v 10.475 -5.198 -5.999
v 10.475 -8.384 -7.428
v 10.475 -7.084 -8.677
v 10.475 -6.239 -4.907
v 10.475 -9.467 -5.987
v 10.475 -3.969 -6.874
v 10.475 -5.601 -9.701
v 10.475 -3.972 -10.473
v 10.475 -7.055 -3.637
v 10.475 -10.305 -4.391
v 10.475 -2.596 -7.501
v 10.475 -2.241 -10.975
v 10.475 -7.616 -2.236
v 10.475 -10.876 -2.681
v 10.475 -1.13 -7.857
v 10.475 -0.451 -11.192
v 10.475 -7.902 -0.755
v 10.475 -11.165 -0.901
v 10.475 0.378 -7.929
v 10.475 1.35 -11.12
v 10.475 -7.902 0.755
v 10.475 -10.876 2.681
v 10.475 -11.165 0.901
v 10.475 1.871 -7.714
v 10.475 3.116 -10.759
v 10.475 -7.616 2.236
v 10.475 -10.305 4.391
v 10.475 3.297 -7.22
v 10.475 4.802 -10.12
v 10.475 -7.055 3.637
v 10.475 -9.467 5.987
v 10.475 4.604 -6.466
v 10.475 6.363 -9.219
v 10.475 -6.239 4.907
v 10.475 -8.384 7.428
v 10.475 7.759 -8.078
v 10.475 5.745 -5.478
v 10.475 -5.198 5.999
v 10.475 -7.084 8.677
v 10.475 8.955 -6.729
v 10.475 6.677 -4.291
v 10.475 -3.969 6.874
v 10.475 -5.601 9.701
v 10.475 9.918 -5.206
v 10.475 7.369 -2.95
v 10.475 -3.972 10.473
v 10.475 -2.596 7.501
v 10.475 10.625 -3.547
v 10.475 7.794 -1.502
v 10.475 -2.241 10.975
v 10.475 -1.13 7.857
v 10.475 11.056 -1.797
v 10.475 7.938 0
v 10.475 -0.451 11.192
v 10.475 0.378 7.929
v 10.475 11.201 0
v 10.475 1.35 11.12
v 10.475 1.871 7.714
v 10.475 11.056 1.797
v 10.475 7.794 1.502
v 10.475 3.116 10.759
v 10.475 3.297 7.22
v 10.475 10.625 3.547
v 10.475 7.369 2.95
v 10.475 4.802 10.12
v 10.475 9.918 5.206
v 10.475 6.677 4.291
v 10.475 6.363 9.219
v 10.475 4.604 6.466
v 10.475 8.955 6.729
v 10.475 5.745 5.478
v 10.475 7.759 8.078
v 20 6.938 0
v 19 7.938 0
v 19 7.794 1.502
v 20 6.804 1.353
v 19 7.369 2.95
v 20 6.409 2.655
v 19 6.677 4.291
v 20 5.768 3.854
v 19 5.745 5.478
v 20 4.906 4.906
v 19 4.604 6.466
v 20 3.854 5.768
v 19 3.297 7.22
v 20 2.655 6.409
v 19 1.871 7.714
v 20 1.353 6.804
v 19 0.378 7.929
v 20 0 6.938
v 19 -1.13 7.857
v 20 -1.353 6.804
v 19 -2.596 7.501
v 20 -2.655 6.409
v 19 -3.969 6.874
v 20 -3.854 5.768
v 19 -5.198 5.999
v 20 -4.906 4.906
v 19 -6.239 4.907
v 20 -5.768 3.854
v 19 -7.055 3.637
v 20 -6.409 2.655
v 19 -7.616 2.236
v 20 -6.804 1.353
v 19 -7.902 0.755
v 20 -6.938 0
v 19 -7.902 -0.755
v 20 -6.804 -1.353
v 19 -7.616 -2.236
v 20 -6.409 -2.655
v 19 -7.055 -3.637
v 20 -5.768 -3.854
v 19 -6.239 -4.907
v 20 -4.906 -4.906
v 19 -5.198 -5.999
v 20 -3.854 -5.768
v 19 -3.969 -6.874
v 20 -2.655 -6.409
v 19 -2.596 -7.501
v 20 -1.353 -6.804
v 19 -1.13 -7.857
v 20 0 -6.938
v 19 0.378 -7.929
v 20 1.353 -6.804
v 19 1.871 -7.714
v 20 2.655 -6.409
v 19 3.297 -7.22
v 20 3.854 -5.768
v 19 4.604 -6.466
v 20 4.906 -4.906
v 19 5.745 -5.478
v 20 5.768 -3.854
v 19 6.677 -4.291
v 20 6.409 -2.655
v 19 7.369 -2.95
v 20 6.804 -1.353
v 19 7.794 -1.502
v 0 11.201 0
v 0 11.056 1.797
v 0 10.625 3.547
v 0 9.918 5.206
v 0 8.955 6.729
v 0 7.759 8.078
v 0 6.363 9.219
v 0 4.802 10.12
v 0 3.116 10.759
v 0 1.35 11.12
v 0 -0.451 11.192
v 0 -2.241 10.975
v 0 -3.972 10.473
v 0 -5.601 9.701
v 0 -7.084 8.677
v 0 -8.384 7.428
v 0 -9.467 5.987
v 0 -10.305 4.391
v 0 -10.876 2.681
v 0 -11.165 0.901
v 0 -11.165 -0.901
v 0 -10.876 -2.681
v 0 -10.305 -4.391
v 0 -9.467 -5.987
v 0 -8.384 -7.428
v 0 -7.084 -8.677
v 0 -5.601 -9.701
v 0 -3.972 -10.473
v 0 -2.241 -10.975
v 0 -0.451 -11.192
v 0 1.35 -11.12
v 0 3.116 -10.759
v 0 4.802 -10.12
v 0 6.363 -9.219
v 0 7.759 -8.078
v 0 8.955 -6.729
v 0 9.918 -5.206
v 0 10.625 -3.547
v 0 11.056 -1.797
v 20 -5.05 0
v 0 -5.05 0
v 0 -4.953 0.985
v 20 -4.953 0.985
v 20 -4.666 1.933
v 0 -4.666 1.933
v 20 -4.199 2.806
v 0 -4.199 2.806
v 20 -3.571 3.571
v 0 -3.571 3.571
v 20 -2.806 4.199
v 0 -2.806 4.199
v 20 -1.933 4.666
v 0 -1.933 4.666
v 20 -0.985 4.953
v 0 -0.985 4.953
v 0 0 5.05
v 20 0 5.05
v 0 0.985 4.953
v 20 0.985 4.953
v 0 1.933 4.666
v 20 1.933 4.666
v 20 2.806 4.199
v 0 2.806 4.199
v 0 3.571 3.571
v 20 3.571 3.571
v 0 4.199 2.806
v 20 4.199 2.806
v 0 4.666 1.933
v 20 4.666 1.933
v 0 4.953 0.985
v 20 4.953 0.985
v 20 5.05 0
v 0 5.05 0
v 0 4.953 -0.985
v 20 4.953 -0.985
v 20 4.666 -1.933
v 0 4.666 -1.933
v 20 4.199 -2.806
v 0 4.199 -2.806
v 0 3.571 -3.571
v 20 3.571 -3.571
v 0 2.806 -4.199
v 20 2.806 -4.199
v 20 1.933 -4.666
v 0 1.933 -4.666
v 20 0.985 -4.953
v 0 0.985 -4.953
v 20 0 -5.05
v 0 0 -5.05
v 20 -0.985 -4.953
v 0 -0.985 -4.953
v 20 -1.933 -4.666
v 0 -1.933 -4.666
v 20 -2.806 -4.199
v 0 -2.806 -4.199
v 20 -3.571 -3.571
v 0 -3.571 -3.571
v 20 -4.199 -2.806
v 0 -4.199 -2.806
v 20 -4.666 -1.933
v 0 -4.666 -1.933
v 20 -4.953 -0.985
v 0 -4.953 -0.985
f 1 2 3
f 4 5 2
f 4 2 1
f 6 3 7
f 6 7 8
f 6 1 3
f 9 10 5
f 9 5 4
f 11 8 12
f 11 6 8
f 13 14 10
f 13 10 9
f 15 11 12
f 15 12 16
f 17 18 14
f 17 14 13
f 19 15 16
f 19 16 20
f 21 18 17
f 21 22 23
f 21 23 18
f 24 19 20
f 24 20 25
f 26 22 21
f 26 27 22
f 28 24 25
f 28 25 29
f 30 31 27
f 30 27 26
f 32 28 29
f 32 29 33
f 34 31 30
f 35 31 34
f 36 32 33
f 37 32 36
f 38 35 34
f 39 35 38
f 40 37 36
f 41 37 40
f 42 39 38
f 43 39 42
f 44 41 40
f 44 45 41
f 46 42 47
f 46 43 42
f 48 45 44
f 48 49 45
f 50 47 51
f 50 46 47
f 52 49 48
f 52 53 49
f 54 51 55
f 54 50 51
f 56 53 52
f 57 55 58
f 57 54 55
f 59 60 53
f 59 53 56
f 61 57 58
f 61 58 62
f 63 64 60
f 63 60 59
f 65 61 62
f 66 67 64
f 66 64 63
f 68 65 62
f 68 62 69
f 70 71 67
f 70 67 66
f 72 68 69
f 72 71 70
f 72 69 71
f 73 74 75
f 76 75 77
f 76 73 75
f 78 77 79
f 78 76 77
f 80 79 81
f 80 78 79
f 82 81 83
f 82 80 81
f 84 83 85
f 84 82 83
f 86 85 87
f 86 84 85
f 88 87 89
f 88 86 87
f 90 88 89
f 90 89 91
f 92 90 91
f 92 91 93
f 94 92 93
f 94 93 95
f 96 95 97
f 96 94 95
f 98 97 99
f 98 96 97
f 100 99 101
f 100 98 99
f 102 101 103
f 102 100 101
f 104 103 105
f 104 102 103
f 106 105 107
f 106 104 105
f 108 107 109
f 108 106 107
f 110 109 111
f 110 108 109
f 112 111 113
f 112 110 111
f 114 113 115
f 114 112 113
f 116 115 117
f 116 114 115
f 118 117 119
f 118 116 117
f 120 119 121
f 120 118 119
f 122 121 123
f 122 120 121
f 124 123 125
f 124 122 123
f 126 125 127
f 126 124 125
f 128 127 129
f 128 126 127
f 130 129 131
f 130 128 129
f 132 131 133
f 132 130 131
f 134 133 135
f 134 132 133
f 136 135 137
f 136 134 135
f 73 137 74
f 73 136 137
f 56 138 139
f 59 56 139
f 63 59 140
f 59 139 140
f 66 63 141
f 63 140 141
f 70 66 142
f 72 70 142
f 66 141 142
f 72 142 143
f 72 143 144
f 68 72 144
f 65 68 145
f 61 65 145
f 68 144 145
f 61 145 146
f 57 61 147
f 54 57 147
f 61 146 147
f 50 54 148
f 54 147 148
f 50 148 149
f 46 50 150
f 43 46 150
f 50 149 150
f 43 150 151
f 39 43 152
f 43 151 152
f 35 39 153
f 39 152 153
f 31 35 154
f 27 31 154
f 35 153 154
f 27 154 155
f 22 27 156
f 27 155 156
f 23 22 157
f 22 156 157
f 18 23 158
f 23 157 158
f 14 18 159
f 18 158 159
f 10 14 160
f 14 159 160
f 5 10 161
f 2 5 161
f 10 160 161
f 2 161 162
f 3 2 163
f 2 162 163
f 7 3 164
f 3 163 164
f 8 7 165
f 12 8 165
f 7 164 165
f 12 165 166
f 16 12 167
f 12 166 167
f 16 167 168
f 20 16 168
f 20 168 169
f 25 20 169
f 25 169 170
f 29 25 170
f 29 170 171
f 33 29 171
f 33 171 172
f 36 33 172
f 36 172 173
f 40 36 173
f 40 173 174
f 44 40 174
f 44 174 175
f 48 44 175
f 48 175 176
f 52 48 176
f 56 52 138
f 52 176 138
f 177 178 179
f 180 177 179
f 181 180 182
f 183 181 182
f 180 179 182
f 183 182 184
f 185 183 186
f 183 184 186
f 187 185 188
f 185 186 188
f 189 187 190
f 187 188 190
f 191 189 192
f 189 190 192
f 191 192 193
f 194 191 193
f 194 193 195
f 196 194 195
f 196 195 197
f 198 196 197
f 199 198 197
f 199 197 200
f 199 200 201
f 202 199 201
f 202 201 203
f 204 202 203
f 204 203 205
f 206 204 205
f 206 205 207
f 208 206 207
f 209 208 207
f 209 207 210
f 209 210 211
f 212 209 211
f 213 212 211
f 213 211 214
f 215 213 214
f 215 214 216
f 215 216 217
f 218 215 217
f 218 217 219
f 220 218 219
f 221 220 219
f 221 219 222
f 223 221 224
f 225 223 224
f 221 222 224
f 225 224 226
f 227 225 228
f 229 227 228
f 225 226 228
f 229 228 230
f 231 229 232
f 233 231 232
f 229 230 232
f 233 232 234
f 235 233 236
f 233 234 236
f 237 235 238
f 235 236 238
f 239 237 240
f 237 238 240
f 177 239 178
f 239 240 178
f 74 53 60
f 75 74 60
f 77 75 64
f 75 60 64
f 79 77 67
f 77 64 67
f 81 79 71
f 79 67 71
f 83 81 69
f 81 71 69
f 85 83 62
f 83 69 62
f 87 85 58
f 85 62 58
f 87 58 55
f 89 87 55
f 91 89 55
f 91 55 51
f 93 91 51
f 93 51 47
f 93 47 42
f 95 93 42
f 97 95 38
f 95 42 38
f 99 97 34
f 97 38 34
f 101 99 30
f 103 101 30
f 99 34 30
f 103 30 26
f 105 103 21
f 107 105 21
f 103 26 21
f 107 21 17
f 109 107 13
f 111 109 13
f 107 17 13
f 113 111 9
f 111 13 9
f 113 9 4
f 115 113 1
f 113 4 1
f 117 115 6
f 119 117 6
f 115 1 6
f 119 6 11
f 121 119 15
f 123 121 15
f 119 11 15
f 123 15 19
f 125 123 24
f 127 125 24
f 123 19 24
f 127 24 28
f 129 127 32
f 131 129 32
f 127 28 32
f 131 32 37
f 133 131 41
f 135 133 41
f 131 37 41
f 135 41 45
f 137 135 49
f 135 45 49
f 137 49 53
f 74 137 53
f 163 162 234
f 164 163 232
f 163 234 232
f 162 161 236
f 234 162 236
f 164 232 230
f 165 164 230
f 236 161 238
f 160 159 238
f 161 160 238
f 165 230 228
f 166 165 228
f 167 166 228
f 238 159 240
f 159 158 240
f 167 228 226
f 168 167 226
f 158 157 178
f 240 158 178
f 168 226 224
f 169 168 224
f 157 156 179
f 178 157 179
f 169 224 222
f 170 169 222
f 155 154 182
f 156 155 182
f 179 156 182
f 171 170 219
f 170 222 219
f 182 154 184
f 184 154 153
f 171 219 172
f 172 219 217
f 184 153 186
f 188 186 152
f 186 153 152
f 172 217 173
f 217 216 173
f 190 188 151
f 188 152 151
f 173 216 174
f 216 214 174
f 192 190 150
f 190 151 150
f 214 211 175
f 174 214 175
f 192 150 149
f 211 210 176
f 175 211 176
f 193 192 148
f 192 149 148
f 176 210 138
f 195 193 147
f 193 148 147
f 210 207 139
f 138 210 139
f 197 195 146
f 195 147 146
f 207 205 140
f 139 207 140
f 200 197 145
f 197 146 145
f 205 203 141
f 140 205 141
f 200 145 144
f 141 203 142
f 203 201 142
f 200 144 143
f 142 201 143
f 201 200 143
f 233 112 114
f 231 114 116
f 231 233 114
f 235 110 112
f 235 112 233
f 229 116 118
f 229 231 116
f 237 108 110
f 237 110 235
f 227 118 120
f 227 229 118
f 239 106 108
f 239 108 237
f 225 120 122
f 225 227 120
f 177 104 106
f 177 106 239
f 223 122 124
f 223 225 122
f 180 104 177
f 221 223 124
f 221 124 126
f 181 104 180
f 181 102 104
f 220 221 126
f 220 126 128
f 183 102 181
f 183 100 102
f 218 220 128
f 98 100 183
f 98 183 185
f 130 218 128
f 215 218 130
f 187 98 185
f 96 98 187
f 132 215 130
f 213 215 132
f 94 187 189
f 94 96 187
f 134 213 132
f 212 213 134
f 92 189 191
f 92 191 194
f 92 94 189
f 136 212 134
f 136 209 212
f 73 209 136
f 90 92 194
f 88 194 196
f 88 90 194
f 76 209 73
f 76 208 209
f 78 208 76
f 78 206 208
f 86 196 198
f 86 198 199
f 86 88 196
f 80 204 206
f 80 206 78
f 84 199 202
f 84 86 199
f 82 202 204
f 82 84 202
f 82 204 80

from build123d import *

# Parameters (mm, degrees)
F0_R     = 11.2014
F1_DEPTH = 10.47496
F2_R     = 7.9375
F3_DEPTH = 9.525
F5_D     = 10.1
F6_SIZE  = 1


with BuildPart() as f1:
    # F0 (on Right) → F1 (new body)
    with BuildSketch(Plane.YZ):
        Circle(F0_R)
    extrude(amount=F1_DEPTH)

    # F2 (on face) → F3 (join)
    with BuildSketch(Plane.YZ.offset(10.47496)):
        Circle(F2_R)
    extrude(amount=F3_DEPTH)

    # F5 (through all)
    with Locations(Plane.YZ.offset(19.99996)):
        with Locations((0, 0)):
            Hole(F5_D / 2)

    # F6
    f6_edges = [f1.edges().sort_by_distance(p)[0] for p in [
        (19.99996, -7.9375, 0),
    ]]
    chamfer(f6_edges, length=F6_SIZE)


solid = f1.part
